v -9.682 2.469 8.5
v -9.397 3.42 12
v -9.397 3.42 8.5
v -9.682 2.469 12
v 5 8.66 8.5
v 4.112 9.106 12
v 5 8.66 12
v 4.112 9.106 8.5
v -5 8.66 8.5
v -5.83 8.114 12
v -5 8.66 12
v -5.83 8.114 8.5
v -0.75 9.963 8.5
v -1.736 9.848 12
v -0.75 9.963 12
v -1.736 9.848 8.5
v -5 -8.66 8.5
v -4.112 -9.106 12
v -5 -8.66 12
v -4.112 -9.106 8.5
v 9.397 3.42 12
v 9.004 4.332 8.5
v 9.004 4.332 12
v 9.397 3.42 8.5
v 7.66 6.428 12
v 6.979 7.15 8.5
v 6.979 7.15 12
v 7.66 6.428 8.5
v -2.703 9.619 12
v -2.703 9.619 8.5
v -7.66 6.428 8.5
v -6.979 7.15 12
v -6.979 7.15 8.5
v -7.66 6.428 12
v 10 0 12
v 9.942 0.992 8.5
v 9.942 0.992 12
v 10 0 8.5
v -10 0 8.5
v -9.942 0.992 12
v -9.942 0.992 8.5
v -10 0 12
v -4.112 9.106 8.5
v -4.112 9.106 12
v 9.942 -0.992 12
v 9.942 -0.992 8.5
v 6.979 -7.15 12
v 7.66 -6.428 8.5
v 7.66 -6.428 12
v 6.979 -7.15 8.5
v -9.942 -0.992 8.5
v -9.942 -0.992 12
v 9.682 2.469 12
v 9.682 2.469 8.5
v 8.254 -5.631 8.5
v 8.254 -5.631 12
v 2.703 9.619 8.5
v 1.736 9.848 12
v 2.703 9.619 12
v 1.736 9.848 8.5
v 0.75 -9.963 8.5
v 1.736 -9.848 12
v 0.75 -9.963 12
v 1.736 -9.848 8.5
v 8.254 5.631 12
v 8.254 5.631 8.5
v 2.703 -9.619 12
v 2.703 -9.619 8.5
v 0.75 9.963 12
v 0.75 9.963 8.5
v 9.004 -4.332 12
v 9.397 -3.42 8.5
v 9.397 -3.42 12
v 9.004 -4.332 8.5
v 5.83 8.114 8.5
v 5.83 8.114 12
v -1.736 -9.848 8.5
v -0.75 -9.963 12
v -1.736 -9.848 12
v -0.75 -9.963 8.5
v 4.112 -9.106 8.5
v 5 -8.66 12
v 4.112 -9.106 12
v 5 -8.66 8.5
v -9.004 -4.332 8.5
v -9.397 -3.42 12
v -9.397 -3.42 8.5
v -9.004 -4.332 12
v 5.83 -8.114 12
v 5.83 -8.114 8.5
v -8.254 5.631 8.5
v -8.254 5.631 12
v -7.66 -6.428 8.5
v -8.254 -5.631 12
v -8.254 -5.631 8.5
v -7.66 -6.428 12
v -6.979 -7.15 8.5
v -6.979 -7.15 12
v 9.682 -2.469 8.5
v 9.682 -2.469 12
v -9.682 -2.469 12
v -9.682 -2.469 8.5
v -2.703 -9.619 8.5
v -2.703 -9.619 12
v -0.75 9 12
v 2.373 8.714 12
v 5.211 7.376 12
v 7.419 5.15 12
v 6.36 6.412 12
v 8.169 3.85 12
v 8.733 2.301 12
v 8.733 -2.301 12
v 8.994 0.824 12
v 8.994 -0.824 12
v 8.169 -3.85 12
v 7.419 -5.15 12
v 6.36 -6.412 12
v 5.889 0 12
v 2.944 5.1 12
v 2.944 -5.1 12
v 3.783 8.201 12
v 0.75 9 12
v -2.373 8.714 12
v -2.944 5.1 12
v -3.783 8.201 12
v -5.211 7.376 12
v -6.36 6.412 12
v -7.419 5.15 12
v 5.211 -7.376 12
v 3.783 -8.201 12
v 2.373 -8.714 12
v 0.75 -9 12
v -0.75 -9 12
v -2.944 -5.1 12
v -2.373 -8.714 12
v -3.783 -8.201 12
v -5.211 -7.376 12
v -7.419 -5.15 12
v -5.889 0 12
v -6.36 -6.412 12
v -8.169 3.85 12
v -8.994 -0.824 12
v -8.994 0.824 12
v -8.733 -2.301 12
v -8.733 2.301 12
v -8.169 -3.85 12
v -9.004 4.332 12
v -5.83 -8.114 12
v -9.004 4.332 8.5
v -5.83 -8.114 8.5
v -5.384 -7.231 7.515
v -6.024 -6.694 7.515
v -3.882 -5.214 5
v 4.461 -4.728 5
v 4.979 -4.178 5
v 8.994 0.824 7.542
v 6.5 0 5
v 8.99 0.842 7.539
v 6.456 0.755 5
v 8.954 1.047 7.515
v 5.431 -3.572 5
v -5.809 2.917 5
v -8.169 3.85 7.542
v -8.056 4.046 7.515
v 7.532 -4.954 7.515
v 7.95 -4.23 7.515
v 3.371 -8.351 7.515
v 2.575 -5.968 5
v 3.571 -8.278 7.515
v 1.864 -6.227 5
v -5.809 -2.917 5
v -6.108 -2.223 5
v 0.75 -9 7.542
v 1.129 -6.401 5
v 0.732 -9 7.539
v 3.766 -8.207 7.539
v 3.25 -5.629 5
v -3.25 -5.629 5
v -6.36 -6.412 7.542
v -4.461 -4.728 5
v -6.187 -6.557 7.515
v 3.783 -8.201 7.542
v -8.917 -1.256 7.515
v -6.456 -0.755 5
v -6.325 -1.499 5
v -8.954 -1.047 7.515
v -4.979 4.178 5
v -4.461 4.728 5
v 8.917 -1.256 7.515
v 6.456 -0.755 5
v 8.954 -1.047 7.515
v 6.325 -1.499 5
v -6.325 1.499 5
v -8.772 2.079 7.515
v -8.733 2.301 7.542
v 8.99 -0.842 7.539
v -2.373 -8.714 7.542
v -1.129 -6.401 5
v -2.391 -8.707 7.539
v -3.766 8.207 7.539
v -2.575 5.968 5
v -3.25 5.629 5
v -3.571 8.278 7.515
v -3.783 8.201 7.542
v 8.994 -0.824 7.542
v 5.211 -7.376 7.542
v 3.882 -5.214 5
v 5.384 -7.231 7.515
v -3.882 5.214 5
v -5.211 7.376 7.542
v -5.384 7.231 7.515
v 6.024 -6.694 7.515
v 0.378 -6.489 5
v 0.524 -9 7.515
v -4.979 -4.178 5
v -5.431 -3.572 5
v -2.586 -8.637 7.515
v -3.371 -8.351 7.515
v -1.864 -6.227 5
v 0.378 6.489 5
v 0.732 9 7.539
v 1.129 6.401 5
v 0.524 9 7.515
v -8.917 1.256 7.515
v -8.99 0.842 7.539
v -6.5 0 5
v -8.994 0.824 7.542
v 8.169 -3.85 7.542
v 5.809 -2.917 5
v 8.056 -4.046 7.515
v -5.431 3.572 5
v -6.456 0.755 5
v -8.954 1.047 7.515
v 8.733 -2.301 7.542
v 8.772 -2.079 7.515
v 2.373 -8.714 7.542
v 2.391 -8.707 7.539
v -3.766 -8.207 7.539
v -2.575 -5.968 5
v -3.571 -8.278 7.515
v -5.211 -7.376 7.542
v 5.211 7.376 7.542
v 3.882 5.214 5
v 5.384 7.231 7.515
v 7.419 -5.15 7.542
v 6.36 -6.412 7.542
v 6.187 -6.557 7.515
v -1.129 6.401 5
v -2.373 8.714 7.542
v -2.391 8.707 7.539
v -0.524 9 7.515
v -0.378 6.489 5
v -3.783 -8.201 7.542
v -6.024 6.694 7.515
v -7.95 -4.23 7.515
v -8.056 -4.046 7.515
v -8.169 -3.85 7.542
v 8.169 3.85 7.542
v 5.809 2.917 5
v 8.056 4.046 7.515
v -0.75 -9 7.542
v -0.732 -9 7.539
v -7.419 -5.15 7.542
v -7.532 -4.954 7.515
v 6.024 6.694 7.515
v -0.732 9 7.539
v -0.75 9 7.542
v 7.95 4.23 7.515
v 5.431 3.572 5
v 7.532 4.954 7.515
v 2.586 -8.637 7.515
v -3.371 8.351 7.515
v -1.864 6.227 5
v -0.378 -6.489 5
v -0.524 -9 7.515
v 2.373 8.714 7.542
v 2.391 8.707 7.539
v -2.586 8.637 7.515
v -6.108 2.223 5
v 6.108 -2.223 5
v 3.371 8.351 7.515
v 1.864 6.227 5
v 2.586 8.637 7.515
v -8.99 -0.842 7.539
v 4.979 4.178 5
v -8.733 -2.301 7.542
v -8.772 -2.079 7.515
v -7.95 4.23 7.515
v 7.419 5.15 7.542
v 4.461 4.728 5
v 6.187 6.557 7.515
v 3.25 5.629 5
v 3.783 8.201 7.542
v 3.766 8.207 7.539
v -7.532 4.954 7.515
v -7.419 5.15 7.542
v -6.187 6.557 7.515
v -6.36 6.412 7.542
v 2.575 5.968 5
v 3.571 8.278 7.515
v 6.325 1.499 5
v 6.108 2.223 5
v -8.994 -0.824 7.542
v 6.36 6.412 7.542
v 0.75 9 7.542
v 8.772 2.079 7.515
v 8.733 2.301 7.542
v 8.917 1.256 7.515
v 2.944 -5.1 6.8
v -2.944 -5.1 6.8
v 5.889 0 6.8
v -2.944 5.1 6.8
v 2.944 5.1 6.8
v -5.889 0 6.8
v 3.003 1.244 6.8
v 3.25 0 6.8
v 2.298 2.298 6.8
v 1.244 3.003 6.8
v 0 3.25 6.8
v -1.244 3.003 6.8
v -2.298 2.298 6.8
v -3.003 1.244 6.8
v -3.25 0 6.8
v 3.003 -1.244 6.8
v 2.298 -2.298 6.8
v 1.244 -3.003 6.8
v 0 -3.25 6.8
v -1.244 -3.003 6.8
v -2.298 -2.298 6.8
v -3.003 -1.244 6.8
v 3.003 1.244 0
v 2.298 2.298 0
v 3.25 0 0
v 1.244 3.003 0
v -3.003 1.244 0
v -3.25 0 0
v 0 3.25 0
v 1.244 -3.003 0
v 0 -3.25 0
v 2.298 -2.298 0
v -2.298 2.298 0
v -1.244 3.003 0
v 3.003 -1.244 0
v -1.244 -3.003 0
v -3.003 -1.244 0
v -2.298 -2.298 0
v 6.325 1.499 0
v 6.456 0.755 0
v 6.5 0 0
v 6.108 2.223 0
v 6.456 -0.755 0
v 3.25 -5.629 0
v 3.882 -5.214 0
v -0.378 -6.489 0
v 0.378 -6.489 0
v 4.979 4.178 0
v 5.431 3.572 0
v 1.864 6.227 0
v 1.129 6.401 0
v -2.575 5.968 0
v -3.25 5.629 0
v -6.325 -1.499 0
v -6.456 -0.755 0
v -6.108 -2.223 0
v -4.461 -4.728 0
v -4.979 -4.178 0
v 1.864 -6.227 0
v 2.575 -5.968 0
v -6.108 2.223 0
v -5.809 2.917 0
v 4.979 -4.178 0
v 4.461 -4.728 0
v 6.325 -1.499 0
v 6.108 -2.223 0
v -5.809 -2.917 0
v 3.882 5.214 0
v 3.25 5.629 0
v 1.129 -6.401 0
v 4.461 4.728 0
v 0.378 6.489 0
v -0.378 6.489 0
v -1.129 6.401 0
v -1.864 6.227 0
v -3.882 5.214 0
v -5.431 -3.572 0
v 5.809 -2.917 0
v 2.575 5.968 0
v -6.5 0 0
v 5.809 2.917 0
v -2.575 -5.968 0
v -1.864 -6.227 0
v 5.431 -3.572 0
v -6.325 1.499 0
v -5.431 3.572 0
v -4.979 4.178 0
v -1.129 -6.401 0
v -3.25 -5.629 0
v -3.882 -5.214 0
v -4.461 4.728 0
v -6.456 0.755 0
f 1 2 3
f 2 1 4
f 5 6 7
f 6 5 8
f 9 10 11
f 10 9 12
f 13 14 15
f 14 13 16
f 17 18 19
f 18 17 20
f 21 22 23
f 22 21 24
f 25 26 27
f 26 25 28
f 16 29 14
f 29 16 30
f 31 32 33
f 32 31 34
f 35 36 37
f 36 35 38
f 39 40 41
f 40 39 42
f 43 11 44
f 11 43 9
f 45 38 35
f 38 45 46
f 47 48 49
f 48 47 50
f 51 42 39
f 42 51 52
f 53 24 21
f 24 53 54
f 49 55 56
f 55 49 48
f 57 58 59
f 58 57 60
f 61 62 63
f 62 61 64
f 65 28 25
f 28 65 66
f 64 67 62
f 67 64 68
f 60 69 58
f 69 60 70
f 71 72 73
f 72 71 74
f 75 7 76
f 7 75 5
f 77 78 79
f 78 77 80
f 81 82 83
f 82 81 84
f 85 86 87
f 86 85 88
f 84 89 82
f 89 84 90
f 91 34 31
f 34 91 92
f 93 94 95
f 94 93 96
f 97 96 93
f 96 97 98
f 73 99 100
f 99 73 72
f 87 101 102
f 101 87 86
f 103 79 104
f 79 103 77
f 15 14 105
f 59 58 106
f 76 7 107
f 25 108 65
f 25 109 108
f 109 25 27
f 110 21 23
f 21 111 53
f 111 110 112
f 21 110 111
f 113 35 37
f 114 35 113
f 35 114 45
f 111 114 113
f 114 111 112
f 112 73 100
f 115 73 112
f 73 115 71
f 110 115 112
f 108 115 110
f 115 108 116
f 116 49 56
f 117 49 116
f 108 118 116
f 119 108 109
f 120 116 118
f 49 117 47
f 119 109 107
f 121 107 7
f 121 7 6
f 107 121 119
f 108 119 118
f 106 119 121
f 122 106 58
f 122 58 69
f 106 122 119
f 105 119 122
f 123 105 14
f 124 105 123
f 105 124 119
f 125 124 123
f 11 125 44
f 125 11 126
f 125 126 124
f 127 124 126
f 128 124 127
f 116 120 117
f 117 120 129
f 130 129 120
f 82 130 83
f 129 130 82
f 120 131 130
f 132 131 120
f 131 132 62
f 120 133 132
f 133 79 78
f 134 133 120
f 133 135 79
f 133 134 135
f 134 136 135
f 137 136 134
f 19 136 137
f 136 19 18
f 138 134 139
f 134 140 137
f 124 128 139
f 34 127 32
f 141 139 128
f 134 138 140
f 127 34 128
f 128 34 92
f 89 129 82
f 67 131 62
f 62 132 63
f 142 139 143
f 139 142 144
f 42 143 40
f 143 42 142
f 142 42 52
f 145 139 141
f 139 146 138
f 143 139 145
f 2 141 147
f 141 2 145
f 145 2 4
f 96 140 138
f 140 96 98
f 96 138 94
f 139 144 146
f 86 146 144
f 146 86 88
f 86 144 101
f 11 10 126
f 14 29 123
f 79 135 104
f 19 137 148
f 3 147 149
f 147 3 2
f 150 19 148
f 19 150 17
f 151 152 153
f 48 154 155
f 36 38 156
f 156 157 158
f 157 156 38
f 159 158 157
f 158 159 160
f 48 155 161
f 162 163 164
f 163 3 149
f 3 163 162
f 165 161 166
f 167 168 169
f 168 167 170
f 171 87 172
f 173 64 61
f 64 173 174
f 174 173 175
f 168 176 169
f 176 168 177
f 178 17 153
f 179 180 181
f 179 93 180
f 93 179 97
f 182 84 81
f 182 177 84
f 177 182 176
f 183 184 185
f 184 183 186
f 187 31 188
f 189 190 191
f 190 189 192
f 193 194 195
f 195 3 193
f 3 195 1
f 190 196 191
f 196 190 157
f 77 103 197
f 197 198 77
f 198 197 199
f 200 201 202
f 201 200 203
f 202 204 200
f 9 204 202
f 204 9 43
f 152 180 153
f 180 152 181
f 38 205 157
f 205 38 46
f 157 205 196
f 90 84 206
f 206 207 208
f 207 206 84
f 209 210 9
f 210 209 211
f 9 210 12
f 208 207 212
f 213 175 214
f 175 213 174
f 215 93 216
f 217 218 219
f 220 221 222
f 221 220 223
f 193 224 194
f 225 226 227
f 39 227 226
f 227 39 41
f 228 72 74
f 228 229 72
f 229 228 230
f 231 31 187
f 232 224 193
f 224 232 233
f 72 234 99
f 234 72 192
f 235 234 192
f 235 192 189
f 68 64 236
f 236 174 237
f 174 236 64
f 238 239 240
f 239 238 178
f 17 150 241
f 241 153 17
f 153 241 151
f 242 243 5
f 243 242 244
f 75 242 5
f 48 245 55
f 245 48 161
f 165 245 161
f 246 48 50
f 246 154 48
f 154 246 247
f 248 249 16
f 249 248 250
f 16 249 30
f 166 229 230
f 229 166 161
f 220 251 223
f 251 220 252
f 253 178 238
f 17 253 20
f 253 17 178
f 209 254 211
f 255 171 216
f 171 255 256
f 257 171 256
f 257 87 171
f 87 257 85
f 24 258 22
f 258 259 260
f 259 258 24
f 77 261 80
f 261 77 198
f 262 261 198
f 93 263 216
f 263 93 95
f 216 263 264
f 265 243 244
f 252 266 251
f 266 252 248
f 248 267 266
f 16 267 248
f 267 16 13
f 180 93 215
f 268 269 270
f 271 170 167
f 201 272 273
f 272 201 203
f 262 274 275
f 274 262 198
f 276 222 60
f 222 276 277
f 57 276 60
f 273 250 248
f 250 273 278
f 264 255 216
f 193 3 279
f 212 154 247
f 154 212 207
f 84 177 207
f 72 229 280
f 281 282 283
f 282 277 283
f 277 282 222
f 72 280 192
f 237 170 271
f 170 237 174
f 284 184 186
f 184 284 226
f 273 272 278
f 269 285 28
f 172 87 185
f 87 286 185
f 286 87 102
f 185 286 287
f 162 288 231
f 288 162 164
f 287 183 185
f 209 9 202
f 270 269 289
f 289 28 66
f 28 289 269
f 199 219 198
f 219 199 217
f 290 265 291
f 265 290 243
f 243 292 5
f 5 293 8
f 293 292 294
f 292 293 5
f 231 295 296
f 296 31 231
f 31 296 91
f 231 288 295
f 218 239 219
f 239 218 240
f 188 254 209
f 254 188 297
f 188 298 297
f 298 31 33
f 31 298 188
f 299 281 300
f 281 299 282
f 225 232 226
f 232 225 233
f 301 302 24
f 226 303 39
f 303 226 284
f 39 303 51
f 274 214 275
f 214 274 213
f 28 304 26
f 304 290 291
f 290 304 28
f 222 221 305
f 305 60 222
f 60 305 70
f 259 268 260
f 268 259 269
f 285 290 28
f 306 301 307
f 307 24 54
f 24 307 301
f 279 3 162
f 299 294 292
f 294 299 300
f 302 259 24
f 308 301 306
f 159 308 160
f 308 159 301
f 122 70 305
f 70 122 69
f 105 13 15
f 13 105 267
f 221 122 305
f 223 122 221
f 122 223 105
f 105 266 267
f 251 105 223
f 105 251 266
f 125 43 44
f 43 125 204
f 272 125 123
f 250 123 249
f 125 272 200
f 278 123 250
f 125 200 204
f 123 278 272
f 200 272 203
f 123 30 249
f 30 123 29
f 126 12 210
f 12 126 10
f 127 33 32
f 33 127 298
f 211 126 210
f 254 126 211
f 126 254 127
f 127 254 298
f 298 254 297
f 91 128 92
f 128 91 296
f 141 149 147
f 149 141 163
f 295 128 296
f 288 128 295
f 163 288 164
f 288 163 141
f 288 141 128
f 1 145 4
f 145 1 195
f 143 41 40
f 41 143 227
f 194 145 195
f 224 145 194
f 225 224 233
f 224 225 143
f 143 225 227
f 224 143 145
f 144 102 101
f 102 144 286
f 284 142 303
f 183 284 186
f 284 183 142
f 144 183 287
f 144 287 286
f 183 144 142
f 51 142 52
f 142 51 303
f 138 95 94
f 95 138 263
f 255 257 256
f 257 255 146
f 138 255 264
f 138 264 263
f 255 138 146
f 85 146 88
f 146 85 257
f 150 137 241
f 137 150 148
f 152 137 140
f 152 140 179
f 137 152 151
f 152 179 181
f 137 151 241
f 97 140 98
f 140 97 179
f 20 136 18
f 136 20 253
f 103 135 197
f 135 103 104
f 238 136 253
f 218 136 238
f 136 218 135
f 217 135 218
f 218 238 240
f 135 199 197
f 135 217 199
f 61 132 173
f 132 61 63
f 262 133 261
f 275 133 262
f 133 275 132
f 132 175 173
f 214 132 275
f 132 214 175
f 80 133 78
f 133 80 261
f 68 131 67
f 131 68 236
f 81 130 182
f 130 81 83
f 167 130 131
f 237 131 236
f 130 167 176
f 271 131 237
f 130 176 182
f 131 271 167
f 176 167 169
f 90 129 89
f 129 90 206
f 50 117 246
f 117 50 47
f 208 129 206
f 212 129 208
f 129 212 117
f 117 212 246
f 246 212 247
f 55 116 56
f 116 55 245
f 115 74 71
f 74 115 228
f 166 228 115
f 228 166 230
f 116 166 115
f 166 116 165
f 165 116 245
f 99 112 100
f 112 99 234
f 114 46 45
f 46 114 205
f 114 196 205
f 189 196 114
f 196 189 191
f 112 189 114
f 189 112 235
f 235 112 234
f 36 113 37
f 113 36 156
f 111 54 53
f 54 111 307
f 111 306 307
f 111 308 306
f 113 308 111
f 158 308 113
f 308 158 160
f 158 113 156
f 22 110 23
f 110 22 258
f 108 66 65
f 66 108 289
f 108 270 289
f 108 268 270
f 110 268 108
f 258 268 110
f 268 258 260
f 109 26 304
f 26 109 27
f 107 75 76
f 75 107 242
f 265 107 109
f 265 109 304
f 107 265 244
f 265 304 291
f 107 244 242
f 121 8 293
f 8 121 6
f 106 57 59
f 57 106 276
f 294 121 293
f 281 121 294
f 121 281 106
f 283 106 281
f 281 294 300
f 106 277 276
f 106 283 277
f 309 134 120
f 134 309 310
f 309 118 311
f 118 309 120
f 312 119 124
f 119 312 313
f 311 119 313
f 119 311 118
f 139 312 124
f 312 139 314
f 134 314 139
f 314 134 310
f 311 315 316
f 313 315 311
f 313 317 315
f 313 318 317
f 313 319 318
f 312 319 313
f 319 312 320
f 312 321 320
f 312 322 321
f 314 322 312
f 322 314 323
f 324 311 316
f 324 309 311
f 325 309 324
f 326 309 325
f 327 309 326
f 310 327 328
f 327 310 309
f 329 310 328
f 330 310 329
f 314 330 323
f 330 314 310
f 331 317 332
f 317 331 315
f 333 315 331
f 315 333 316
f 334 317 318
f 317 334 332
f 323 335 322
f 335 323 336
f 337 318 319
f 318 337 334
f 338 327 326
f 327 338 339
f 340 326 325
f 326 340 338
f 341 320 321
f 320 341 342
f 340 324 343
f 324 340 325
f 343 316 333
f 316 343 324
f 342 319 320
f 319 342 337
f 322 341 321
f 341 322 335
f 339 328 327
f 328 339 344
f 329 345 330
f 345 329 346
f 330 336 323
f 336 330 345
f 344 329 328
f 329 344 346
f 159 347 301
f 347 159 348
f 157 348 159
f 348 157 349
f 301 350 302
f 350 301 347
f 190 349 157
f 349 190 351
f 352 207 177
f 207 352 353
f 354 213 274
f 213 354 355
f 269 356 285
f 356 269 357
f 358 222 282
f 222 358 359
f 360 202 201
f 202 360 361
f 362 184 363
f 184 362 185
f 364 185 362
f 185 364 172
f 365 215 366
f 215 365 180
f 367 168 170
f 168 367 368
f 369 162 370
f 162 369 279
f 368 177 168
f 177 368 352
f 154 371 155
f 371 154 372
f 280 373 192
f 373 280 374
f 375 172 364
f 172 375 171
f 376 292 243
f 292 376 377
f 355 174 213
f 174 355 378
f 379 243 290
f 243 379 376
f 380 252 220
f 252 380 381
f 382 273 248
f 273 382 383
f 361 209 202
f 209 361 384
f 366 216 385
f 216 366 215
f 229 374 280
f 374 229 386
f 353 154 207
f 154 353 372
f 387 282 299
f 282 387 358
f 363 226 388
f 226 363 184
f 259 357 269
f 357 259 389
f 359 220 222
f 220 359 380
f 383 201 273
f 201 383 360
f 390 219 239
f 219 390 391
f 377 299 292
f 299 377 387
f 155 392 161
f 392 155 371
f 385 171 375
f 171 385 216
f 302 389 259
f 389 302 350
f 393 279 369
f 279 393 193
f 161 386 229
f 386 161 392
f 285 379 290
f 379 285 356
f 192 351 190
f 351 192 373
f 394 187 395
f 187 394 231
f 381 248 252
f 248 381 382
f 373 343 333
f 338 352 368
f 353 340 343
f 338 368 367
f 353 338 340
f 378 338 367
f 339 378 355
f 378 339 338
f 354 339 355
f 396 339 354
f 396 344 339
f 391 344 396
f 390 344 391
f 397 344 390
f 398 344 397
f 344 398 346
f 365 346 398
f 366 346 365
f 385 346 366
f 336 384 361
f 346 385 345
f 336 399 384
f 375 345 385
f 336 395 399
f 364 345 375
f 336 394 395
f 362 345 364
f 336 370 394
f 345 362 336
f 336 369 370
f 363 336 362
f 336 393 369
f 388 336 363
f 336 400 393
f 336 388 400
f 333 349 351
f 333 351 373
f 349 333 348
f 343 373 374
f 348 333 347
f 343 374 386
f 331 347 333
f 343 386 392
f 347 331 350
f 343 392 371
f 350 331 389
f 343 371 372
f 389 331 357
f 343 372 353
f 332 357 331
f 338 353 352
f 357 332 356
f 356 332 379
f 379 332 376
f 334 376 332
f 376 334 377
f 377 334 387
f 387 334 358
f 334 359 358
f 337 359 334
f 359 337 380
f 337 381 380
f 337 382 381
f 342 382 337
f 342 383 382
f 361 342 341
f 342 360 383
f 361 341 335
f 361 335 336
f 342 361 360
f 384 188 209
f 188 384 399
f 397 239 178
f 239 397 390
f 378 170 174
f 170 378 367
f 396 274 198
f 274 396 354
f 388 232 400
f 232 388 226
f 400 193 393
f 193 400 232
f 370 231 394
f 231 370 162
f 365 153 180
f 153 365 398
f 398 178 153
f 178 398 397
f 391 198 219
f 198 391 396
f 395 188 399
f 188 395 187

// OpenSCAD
// file: modules.scad
// Fonctions personnalisées

//http://forum.openscad.org/Wish-mirror-copy-true-td10681.html
module copy_mirror(vec=[0,1,0])
{
    children();
    mirror(vec) children();
}

module ecrou(plat,h){
  cylinder(d=plat*2/sqrt(3), h=h, $fn=6);
}


module courroie(diam,longueur){
  color ("black")
  difference(){
    hull(){
      cylinder(d=diam+1, h=6, $fn=32);
      translate([longueur,0,0]) cylinder(d=diam+1, h=6, $fn=32);
    }
    translate([0,0,-1])
    hull(){
      cylinder(d=diam-1, h=8, $fn=32);
      translate([longueur,0,0]) cylinder(d=diam-1, h=8, $fn=32);
    }
  }
  
  
}
// file: config.scad
// Paramètres de la machine

decal=-30;            // décallage du chassis xz
hauteur=400;          // hauteur totale chassis
largeur=400;          // largeur totale chassis
longueur=470;         // longueur totale chassis
hauteur_base=90;      // hauteur de la base
entraxe_y=140;        // distance entre les tiges Ø8 axe Y
entraxe_x=45;         // distance entre les tiges Ø8 axe X

couleur=[1,0.6,0];



// Paramètre des pièces et jeux

// écart plateau/courroie
// y_belt_holder
belt_h=13;      // écart entre la courroie et le plateau

// écart plateau/tiges lisses
// y_lm8uu
decal_plateau=12; // Décallage en Y

// décallage des tiges lisses Y
// support_tige8_y
decal_tiges=5;

// décallage moteur Y
// y_motor
decal_motory_z=11;
decal_motory_y=25;

// Equerres de fixation position fermée
eq_ec=10;      // écart entre profilés

// Fixations axe Z
pos_z=26;      // position des axes par rapport au profilé (>= 21)
hauteur_z=20;  // hauteur des fixations
entraxe_z=17;  // distance entre les tiges Ø8 et M5
// est ce que la tige de 8 dépasse du profilé de 30?
// si oui, on décale les fixations
decalx=max(-42/2+entraxe_z+8/2+2, 0);

// Roulements linéaires
lbd = 15; // diamètre ext
lbh = 24; // hauteur

// x_carriage
he_x=23;  // entraxe hotend x
he_y=23;  // entraxe hotend y
sen_x=13; // entraxe capteur x
sen_y=23; // entraxe capteur y

// Plats écrous
ec3=5.7;
ec4=7.2;
ec5=8.2;
ec6=10.2;

// Jeu sur plats pour les écrous glissants
jec=0.2;

// hauteur écrous
ec3h=2.4;
ec4h=3.2;
ec5h=4.7;
ec6h=5.2;

// Vis
vis3=3.5;
vis4=4.5;
vis5=5.5;
vis6=6.5;

// nombre de dents des poulies
poulie=20;

// Pas des courroies
pas=2;

// diamètre des poulies
dpoulie=poulie*pas/3.1416;
// main file
// eLKa1
// molette_m6
// GNU GPL v3
// lkiefer <blog.lkiefer.org> and contributors
// http://www.reprap.org/wiki/ELKa
// https://github.com/kimented/elka1

include <config.scad>;
use <modules.scad>;

module molette_m6(){

  n=18;     // nombre de moletages
  lar=1.5;  // largeur des moletages
  h=7;      // hauteur totale sans alonge
  d=20;     // diamètre extérieur
  ch=3.5;     // hauteur du chanfrein
  alonge=5; // hauteur supplémentaire



  echo ("molette_m6");
  translate([0,0,alonge])
  color (couleur) {
    difference(){
      union(){
        translate([0,0,ch]) cylinder(h=h-ch, d=d, $fn=n*3);
        cylinder(h=ch, d2=d, d1=d-ch*2, $fn=n*3);
      }
      
      for(i=[0:1:n-1]){
        rotate([0,0,360/n*i]) translate([-lar/2,d/2-1,-1]) cube([lar,5,h+2]);
      }
      translate([0,0,h-ec6h]) ecrou(ec6,ec6h+1);
      translate([0,0,-1]) cylinder(d=vis6, h=h+2, $fn=16);
      //cube([30,30,30]); //coupe
    }
    if (alonge != 0){
      difference(){
        translate([0,0,-alonge]) cylinder(d=20-2*ch, h=alonge, $fn=n*3);
        translate([0,0,-alonge-1]) cylinder(d=vis6, h=alonge+2, $fn=16);
      }
    }
  }
}

molette_m6();
